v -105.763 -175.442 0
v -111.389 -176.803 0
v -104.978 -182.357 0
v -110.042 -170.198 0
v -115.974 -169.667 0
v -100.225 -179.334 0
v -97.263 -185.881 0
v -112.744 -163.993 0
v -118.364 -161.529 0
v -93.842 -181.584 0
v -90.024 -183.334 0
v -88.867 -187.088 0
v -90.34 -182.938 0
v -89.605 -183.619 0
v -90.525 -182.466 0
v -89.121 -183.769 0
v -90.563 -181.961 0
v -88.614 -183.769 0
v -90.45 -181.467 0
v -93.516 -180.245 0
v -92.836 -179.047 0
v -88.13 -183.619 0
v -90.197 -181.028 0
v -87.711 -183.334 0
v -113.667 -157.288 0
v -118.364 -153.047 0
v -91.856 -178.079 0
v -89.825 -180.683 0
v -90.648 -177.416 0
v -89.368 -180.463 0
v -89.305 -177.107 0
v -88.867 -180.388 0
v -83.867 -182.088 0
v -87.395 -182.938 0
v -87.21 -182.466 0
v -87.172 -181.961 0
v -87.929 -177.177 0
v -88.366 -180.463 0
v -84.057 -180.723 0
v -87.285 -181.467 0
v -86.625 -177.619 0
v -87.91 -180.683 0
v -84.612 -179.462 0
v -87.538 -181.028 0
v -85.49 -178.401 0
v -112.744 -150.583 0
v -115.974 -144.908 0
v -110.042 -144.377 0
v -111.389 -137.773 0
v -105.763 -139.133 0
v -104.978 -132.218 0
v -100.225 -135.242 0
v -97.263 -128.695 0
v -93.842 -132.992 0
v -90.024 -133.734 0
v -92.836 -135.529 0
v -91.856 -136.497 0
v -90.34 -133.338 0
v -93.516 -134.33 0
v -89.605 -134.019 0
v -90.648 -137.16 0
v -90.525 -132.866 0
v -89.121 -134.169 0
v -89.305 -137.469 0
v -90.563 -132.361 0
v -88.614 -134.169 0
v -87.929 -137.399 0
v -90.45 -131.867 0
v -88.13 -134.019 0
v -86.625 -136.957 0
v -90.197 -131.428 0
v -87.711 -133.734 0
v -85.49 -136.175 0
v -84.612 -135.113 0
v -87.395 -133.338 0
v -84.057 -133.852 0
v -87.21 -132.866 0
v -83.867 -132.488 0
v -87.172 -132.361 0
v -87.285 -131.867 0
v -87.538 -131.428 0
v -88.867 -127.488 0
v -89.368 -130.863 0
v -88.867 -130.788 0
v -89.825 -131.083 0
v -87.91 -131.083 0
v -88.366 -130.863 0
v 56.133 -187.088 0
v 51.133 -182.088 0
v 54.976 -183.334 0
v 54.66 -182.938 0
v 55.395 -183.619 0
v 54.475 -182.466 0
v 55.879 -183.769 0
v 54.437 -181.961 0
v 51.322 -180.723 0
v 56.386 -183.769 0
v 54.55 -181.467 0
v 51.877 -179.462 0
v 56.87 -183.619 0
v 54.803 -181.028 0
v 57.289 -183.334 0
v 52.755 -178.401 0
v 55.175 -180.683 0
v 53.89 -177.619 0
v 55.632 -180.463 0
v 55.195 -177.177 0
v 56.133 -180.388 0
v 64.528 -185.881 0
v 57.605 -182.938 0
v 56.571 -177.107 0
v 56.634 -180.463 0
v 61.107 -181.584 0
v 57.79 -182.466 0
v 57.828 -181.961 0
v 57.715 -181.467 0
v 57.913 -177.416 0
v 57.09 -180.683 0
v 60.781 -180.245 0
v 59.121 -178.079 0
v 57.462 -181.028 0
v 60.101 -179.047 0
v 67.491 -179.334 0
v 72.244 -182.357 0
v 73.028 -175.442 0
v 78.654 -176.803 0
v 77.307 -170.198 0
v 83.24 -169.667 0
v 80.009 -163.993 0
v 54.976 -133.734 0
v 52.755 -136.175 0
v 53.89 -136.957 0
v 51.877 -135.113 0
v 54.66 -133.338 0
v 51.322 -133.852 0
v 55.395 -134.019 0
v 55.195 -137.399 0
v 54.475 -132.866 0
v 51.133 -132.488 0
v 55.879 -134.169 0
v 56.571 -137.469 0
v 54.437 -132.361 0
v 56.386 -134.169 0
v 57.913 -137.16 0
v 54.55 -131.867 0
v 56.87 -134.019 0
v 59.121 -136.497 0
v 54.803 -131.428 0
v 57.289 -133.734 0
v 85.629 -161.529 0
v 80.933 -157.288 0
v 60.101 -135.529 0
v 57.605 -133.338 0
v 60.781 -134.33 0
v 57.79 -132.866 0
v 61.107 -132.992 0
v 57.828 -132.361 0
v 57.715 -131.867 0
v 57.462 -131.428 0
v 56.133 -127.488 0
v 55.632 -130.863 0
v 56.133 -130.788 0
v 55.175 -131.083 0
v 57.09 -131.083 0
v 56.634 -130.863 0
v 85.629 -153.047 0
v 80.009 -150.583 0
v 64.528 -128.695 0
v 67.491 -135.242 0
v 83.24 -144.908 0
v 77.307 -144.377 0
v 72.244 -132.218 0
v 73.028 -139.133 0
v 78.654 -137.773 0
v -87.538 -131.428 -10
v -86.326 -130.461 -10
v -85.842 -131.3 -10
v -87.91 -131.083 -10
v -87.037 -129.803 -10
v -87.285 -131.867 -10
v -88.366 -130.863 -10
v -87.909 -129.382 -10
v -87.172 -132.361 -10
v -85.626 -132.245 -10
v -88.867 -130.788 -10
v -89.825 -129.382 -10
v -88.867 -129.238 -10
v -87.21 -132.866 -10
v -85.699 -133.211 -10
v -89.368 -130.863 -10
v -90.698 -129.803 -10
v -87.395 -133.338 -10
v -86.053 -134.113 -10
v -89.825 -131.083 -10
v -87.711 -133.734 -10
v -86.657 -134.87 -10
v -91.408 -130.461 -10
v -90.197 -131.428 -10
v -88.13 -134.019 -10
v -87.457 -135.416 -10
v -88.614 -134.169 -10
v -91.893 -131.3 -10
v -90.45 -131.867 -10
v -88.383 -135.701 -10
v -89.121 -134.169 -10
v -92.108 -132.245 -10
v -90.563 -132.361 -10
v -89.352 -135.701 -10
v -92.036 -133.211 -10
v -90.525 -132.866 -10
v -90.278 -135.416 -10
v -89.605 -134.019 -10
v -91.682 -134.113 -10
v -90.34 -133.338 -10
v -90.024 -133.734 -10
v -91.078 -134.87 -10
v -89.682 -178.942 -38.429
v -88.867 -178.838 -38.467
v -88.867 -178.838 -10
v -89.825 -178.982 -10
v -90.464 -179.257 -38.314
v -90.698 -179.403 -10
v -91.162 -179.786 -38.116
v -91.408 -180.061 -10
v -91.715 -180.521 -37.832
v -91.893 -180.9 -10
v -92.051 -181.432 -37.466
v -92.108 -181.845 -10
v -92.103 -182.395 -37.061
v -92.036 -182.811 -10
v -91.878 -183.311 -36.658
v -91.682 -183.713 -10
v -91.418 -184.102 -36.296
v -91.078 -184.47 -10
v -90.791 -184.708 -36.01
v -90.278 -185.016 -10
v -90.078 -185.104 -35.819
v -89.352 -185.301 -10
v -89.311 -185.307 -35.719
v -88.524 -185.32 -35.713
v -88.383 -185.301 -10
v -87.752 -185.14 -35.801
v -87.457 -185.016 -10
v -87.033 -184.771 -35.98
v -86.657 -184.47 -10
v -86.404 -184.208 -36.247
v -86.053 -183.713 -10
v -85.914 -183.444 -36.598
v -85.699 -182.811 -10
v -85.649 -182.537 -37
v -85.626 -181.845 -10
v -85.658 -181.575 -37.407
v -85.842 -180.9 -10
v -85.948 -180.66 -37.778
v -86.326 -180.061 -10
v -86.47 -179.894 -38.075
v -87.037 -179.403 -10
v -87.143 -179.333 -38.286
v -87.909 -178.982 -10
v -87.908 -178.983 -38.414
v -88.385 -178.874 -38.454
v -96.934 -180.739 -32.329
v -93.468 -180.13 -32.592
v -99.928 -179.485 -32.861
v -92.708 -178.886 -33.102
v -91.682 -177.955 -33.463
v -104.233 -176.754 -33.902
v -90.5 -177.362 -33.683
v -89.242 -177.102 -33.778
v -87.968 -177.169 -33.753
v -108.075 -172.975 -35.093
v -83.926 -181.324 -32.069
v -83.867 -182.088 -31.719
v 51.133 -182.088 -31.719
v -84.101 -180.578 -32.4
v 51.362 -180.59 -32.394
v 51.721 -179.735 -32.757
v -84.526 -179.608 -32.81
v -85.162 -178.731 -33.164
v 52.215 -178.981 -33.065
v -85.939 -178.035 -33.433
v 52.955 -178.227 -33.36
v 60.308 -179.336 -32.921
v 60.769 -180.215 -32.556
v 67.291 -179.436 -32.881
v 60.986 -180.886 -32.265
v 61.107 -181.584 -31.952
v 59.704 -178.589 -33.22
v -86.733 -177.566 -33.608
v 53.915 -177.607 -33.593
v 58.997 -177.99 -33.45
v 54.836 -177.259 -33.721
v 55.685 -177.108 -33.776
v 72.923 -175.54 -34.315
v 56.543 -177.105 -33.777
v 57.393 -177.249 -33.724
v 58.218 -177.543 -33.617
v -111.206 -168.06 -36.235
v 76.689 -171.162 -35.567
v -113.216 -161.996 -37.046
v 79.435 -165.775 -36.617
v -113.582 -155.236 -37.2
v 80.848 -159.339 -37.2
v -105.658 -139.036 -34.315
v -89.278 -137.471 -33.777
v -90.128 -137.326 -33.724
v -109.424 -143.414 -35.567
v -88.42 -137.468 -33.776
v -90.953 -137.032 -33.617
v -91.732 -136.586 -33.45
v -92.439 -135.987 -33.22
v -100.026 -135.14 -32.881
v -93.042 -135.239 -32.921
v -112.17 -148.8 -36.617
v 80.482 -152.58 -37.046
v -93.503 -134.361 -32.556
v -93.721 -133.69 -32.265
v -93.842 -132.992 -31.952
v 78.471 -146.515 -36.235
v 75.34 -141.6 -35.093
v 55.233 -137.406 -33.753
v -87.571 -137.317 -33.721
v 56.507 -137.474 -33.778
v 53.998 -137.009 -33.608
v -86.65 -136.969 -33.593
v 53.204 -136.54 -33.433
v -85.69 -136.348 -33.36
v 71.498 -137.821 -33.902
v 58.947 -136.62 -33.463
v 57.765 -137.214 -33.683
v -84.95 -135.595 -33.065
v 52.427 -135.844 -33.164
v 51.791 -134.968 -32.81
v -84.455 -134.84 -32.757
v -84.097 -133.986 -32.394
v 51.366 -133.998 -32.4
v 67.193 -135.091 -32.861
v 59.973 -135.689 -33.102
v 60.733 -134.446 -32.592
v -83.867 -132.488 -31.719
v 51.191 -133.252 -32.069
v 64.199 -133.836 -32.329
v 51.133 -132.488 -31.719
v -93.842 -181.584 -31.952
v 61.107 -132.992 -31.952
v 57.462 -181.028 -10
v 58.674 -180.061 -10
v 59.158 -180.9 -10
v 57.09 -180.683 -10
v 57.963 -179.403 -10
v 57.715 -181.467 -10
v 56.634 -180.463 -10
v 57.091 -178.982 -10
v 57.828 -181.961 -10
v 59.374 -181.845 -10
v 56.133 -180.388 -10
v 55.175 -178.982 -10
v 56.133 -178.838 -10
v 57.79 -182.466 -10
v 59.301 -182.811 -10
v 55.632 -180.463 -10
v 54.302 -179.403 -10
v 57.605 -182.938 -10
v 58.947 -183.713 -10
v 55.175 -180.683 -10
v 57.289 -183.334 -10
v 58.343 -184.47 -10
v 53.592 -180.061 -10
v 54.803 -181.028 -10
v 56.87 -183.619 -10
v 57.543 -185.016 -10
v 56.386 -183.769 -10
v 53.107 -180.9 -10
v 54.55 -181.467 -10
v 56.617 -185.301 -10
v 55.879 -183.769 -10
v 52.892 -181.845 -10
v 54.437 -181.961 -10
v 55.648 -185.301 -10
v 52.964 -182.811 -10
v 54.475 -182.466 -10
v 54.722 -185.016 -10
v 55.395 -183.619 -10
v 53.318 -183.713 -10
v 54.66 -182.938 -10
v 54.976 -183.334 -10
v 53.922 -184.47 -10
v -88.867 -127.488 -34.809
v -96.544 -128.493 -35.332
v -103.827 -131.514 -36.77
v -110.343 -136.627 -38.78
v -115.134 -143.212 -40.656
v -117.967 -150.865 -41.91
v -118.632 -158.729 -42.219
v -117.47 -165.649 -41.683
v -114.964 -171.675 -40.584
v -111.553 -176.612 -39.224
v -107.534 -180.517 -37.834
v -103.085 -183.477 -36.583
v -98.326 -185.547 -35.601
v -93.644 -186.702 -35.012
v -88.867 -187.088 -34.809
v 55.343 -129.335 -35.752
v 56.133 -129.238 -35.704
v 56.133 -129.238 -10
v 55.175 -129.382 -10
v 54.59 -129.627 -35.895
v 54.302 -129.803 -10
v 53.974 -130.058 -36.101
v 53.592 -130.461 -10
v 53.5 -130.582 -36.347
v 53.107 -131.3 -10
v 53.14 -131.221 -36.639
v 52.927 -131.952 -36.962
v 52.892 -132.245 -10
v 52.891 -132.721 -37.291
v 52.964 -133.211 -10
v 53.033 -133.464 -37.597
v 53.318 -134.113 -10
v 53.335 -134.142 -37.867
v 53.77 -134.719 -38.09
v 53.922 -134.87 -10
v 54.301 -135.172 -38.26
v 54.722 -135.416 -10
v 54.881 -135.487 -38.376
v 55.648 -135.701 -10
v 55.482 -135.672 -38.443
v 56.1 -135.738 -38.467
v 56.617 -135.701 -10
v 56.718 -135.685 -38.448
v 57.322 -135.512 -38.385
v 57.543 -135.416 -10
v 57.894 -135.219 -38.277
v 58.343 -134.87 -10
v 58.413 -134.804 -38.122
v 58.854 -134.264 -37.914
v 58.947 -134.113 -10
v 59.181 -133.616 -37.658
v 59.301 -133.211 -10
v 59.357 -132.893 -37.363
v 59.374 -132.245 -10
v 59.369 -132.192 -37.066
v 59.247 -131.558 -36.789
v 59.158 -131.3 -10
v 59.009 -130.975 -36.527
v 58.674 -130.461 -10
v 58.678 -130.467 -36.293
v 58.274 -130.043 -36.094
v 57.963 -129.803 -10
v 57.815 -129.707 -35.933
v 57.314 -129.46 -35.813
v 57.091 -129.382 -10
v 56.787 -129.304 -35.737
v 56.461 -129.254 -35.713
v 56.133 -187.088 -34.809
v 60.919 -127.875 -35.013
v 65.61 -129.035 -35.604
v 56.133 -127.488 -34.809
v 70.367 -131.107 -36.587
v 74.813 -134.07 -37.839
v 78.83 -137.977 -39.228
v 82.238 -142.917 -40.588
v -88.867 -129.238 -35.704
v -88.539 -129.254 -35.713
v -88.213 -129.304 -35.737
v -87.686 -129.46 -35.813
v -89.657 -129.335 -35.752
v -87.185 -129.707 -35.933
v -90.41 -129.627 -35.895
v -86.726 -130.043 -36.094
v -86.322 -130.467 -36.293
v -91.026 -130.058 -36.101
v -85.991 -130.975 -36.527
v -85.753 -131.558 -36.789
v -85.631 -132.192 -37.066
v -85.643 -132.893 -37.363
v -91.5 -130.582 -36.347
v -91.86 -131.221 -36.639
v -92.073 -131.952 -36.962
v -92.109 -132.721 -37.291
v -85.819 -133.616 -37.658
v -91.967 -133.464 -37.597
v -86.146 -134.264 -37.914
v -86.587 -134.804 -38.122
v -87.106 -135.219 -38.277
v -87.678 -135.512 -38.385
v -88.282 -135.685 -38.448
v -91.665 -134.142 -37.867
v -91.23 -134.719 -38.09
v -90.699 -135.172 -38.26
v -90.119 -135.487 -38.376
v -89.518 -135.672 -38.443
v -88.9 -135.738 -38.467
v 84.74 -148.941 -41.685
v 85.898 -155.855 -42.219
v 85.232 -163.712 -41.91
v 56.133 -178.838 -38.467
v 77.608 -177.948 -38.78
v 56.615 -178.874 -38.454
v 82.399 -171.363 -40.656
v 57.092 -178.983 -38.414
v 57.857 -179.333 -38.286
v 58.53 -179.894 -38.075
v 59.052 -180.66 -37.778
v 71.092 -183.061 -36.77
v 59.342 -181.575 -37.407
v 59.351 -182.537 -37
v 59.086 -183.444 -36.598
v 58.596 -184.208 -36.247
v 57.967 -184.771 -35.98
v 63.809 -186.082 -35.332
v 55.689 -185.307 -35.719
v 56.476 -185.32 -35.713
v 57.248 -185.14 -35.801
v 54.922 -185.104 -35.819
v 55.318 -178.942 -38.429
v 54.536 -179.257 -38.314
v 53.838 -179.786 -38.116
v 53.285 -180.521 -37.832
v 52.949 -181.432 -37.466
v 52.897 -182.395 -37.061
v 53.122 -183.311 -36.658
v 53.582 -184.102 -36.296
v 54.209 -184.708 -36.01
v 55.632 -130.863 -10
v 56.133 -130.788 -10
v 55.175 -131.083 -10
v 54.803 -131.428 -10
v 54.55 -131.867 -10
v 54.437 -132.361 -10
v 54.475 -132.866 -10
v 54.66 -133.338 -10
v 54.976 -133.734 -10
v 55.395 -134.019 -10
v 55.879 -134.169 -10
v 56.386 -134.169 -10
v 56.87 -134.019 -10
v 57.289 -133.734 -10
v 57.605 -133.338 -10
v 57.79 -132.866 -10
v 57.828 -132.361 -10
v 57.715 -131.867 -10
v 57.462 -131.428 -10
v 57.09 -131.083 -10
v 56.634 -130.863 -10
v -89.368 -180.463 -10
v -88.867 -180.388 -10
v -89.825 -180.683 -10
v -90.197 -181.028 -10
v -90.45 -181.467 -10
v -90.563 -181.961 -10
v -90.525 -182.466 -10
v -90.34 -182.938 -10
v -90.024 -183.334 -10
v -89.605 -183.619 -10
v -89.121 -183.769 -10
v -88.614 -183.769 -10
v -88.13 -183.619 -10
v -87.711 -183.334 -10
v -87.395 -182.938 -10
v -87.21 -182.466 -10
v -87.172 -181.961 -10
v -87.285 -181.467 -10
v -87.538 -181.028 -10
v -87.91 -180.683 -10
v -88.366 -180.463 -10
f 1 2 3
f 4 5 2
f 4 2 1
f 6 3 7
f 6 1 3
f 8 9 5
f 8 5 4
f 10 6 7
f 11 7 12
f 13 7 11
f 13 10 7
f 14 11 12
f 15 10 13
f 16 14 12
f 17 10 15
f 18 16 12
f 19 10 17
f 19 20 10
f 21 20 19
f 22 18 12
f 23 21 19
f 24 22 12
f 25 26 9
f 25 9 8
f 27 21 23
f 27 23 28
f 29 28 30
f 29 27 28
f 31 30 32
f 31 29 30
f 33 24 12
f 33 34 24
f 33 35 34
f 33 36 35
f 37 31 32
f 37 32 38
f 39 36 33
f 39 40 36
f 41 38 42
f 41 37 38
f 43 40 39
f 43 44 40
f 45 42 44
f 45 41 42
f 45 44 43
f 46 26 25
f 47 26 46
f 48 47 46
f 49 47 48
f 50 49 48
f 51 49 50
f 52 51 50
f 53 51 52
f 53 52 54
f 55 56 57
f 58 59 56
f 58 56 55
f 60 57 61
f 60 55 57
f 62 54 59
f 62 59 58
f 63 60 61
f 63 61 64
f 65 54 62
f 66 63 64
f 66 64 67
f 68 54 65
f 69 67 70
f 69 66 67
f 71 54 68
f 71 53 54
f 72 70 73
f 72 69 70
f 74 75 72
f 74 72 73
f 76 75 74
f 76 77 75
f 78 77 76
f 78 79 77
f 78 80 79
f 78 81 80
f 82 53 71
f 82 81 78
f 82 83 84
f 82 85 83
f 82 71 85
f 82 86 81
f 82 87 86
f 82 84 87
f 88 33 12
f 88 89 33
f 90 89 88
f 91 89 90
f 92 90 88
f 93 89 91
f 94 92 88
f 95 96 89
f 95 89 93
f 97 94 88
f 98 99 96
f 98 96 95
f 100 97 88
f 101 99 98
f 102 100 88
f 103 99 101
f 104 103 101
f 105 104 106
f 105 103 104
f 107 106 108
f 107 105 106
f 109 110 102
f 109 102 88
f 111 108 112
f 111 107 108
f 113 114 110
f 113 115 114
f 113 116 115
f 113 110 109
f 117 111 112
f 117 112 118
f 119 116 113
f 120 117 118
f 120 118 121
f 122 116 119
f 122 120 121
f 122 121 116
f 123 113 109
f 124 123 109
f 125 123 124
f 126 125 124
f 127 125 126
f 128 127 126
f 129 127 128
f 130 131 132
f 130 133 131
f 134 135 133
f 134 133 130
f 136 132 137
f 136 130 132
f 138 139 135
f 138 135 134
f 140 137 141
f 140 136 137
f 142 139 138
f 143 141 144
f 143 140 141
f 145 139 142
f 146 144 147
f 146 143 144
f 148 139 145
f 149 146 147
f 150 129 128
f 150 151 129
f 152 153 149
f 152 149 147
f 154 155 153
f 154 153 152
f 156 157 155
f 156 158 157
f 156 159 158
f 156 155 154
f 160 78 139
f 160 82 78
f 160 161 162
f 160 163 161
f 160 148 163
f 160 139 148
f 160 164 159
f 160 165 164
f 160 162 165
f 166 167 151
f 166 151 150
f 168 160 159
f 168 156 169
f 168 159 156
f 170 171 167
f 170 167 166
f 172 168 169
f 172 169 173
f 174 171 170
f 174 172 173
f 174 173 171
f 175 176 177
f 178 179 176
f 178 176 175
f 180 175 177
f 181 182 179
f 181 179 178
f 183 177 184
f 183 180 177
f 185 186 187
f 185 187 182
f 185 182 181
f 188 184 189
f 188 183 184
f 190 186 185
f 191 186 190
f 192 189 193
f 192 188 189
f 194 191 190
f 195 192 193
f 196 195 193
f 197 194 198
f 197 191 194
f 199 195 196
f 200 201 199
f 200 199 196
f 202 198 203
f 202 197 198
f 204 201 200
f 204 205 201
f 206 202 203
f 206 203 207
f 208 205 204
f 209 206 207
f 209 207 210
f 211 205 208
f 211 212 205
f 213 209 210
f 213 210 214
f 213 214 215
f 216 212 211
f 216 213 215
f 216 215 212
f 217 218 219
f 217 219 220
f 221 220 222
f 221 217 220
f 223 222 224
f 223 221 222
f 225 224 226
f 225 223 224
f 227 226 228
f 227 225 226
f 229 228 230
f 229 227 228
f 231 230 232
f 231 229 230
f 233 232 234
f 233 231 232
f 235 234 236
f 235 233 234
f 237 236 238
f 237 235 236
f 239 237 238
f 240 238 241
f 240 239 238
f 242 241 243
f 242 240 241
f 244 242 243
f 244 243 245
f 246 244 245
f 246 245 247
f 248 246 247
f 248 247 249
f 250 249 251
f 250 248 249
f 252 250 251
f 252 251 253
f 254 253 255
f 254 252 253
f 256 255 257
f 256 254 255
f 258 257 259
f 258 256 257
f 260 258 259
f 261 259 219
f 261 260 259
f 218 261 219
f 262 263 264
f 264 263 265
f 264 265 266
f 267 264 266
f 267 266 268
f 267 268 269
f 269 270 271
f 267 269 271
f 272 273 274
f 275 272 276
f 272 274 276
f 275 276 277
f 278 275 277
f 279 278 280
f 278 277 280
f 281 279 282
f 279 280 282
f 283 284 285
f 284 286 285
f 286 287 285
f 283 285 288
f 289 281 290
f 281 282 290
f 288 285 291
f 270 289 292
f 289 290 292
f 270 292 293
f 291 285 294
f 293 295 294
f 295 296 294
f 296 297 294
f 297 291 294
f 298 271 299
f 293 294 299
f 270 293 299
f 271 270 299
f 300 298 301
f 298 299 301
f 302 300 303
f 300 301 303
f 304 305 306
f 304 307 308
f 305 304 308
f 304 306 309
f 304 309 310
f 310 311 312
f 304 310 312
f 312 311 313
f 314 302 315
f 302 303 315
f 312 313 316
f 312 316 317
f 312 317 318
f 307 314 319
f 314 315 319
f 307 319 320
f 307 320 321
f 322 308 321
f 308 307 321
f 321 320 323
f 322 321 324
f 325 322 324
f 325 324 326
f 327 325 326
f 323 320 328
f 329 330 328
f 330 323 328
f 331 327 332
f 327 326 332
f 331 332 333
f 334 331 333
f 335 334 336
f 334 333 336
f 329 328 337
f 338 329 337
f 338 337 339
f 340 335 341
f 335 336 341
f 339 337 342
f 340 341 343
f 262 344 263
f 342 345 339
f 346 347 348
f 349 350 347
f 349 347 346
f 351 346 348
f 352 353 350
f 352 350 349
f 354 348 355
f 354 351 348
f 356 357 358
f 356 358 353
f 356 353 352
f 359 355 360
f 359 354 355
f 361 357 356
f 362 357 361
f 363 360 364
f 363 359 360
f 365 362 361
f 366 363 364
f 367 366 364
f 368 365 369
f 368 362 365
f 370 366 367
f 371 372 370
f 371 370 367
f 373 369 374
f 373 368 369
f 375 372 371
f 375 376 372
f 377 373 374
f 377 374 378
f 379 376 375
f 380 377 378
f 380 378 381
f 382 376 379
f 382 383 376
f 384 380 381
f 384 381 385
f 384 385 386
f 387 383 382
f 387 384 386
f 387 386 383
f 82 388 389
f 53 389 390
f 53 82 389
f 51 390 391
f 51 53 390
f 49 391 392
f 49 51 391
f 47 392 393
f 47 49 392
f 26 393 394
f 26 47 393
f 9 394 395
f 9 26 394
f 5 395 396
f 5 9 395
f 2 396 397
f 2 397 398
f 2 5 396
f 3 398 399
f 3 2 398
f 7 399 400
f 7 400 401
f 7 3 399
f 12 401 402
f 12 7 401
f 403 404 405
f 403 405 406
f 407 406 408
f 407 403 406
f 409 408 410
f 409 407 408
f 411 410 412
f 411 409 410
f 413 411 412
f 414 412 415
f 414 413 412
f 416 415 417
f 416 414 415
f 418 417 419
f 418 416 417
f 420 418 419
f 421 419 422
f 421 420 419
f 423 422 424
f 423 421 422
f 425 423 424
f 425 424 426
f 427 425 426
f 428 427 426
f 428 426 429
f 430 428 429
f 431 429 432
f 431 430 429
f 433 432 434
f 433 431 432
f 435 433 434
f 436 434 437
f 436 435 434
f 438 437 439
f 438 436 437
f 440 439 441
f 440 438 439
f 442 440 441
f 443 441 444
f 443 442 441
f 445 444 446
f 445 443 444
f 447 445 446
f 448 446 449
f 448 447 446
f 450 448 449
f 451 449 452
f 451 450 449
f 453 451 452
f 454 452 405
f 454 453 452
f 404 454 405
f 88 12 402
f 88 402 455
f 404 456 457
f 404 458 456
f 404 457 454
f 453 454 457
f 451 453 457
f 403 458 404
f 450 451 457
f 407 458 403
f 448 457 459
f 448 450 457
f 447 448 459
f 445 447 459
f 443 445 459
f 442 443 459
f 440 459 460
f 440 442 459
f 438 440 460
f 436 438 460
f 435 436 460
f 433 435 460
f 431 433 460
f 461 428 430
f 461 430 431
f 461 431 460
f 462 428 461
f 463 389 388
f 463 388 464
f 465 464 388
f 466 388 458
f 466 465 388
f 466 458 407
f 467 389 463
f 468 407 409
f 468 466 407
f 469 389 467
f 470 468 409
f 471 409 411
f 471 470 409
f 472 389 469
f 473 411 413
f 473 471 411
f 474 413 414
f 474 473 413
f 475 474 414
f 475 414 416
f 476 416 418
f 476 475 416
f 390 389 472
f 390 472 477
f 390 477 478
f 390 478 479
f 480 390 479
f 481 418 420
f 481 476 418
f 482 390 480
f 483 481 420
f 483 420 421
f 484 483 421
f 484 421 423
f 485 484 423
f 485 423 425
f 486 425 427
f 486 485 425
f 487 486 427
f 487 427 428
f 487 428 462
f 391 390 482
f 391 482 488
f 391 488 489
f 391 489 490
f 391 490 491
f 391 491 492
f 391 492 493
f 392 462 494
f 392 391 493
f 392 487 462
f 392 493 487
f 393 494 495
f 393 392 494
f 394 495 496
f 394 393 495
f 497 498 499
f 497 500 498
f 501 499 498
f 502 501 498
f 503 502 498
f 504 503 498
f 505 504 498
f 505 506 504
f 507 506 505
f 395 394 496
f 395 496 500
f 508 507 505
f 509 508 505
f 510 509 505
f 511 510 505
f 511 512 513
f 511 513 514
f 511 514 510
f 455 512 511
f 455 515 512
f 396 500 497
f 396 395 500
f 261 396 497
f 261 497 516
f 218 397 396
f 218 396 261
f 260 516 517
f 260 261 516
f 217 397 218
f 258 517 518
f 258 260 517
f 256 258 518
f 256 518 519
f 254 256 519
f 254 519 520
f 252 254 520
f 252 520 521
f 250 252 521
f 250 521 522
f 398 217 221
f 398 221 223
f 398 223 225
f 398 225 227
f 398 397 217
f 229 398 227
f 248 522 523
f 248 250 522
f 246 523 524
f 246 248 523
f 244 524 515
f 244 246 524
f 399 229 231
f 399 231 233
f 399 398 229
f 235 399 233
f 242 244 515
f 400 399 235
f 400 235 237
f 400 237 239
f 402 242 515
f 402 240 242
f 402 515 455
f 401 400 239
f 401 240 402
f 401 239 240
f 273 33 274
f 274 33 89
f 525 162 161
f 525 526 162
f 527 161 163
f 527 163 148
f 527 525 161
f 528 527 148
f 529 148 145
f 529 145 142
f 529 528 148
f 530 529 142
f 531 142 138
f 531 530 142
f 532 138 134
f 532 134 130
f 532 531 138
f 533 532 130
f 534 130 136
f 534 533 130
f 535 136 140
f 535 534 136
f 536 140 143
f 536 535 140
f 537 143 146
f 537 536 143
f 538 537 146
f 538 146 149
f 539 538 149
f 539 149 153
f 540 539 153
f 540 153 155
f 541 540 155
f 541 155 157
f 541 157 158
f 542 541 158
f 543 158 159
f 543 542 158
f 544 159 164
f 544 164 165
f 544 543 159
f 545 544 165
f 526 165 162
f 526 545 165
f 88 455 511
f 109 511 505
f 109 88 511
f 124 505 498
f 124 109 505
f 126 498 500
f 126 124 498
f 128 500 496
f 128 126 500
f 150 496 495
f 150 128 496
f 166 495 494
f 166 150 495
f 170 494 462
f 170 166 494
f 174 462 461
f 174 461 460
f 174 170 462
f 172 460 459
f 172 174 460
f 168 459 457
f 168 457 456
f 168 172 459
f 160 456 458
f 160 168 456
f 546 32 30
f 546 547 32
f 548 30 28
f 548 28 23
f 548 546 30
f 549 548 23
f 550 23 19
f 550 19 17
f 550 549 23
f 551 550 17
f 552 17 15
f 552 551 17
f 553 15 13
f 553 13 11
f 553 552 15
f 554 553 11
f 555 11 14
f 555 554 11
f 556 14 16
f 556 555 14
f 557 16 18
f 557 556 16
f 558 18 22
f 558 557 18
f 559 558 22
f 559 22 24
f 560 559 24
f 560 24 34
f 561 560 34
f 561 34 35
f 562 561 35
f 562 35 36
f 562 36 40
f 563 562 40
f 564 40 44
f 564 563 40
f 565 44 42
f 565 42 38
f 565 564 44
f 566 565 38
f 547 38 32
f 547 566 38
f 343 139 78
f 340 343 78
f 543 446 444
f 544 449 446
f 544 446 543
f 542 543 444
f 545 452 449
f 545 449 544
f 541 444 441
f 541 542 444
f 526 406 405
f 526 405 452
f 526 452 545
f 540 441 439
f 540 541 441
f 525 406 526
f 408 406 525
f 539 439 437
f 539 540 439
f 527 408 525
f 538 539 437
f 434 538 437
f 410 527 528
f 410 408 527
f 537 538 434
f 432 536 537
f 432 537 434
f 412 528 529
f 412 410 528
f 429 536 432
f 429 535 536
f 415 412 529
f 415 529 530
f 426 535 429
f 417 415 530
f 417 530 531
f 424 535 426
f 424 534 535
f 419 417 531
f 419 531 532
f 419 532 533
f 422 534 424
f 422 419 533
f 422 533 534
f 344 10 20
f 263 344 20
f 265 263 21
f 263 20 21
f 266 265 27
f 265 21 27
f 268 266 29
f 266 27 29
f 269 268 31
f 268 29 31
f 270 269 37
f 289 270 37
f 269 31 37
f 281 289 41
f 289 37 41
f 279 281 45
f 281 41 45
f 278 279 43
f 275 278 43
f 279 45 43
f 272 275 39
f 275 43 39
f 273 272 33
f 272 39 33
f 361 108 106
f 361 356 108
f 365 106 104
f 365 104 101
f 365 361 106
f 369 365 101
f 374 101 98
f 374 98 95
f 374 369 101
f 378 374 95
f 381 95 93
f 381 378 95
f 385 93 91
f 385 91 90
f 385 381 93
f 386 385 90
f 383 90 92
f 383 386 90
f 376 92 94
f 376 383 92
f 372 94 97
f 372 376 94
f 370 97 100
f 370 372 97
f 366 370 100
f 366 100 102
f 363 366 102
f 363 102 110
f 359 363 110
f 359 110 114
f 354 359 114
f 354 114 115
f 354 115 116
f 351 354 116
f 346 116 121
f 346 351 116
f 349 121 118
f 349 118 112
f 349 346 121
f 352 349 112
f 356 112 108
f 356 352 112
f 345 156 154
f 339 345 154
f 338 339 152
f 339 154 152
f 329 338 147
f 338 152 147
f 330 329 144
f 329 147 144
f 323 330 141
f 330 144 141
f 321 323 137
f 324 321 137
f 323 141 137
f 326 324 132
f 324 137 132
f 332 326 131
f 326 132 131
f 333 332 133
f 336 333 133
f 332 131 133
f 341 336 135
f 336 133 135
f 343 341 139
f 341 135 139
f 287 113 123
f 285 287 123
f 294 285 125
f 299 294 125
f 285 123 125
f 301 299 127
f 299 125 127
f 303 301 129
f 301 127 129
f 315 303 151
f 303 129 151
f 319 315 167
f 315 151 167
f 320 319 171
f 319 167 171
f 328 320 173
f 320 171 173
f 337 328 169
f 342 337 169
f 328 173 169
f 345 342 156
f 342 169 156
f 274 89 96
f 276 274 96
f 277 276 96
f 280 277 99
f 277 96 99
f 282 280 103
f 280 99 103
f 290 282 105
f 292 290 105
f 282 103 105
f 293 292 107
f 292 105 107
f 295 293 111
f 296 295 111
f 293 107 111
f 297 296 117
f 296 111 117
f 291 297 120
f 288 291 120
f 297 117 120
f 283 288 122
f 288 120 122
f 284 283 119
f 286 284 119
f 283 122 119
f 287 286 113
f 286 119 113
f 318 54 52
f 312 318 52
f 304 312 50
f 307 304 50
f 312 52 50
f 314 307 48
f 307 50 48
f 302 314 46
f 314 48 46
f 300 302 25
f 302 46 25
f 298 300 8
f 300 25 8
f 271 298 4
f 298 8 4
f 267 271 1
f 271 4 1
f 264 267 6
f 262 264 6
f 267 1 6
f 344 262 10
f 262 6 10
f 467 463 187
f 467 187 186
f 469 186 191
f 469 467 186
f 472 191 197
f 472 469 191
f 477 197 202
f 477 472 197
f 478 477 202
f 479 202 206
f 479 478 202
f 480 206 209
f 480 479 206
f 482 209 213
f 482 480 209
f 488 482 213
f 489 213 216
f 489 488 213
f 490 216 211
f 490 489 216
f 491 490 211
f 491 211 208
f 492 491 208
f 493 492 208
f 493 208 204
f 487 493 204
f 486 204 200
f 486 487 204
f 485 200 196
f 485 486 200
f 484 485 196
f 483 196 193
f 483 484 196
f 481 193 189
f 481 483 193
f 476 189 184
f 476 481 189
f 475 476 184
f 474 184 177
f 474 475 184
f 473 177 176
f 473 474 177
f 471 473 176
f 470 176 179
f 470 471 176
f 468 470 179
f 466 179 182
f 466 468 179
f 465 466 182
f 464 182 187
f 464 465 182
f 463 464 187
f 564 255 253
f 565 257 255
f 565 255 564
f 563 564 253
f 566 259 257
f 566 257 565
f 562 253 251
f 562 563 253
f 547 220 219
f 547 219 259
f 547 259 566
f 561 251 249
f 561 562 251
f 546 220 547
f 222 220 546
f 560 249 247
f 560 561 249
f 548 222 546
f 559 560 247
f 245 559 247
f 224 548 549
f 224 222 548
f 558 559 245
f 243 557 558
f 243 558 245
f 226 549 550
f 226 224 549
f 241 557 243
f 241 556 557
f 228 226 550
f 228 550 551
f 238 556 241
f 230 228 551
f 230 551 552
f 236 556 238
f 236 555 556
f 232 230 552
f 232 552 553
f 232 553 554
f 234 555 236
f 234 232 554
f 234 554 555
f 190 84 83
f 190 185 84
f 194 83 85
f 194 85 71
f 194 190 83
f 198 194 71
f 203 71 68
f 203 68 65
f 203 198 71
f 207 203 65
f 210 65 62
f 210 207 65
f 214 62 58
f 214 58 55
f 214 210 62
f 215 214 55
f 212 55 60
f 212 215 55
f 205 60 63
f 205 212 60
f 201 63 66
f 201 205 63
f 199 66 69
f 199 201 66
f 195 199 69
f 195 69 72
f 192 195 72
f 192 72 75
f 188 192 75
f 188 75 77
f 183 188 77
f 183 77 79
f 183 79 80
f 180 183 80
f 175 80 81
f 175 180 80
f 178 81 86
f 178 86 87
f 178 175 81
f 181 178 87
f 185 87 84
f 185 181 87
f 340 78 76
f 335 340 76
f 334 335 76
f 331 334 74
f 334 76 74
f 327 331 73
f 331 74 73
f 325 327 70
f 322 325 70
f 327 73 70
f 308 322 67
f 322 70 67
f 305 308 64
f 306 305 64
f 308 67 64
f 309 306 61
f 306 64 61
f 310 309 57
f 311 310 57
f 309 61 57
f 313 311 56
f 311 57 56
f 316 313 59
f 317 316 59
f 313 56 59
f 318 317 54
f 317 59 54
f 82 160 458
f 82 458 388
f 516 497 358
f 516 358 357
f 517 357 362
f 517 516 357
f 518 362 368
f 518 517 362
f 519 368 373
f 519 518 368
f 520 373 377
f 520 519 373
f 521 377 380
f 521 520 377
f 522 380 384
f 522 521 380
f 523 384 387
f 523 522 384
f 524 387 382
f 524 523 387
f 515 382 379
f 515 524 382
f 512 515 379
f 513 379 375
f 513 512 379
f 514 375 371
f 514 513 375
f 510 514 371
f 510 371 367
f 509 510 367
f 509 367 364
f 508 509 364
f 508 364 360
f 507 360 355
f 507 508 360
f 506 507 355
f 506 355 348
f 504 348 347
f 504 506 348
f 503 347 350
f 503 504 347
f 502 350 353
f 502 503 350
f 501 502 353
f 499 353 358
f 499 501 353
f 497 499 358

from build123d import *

# Parameters (mm, degrees)
BOSS_EXTRUDE2_DEPTH                          = 45
CUT_EXTRUDE1_START                           = -120
CUT_EXTRUDE1_DEPTH                           = 207
CBORE_FOR_M3_HEX_SOCKET_HEAD_CAP_SCR_2_COUNT = 2
CBORE_FOR_M3_HEX_SOCKET_HEAD_CAP_SCR_2_PITCH = 145
CBORE_FOR_M3_HEX_SOCKET_HEAD_CAP_SCR_3_COUNT = 2
CBORE_FOR_M3_HEX_SOCKET_HEAD_CAP_SCR_3_PITCH = 153.248686781
CBORE_FOR_M3_HEX_SOCKET_HEAD_CAP_SCR_4_COUNT = 2
CBORE_FOR_M3_HEX_SOCKET_HEAD_CAP_SCR_4_PITCH = 49.6
CUT_EXTRUDE2_REACH                           = 227.539
CUT_EXTRUDE2_END_RADIUS                      = 58.5
CUT_EXTRUDE2_DIRECTION_2_DEPTH               = 226.538529612


with BuildPart() as part:
    # Sketch2 → Boss-Extrude2 (new body)
    with BuildSketch(Plane.XY):
        with BuildLine():
            Line((56.132610552, -127.487790866), (-88.867389448, -127.487790866))
            ThreePointArc((-88.867389448, -127.487790866), (-118.667389448, -157.287790866), (-88.867389448, -187.087790866))
            Line((-88.867389448, -187.087790866), (56.132610552, -187.087790866))
            ThreePointArc((56.132610552, -187.087790866), (85.932610552, -157.287790866), (56.132610552, -127.487790866))
        make_face()
    extrude(amount=-BOSS_EXTRUDE2_DEPTH)

    # Cut-Extrude1: read off the stored shape, not the designer's step
    # Cut-Extrude1 outline → Cut-Extrude1 (cut)
    with BuildSketch(Plane(origin=(0, 0, 0), x_dir=(0, 0, -1), z_dir=(1, 0, 0)).offset(CUT_EXTRUDE1_START)):
        with BuildLine():
            ThreePointArc((34.808748648, -127.487777676), (42.2355, -157.287790865), (34.808748648, -187.087804055))
            Line((34.808748648, -187.087804055), (45, -187.087790866))
            Line((45, -187.087790866), (45, -127.487790866))
            Line((45, -127.487790866), (34.808748648, -127.487777676))
        make_face()
    extrude(amount=CUT_EXTRUDE1_DEPTH, mode=Mode.SUBTRACT)

    # Sketch6 → CBORE for M3 Hex Socket Head Cap Screw1 (revolve, cut)
    with BuildSketch(Plane(origin=(56.132610552, -132.487790866, -40), x_dir=(0, 1, 0), z_dir=(1, 0, 0))):
        Polygon((0, 0), (0, 40), (1.7, 40), (1.7, 30), (3.25, 30), (3.25, 0.025), (3.275, 0), align=None)
    cbore_for_m3_hex_socket_head_cap_screw1 = revolve(axis=Axis((56.132610552, -132.487790866, -46.35), (0, 0, 1)), mode=Mode.SUBTRACT)

    # CBORE for M3 Hex Socket Head Cap Scr 2: CBORE for M3 Hex Socket Head Cap Screw1 ×2
    with Locations(*[(-i * CBORE_FOR_M3_HEX_SOCKET_HEAD_CAP_SCR_2_PITCH, 0, 0) for i in range(1, CBORE_FOR_M3_HEX_SOCKET_HEAD_CAP_SCR_2_COUNT)]):
        add(cbore_for_m3_hex_socket_head_cap_screw1, mode=Mode.SUBTRACT)

    # CBORE for M3 Hex Socket Head Cap Scr 3: CBORE for M3 Hex Socket Head Cap Screw1 ×2
    with Locations(*[Vector(-0.9461745026730805, -0.32365693332809825, 0) * (i * CBORE_FOR_M3_HEX_SOCKET_HEAD_CAP_SCR_3_PITCH) for i in range(1, CBORE_FOR_M3_HEX_SOCKET_HEAD_CAP_SCR_3_COUNT)]):
        add(cbore_for_m3_hex_socket_head_cap_screw1, mode=Mode.SUBTRACT)

    # CBORE for M3 Hex Socket Head Cap Scr 4: CBORE for M3 Hex Socket Head Cap Screw1 ×2
    with Locations(*[(0, -i * CBORE_FOR_M3_HEX_SOCKET_HEAD_CAP_SCR_4_PITCH, 0) for i in range(1, CBORE_FOR_M3_HEX_SOCKET_HEAD_CAP_SCR_4_COUNT)]):
        add(cbore_for_m3_hex_socket_head_cap_screw1, mode=Mode.SUBTRACT)

    # Cut-Extrude2: up to this cylinder (the profile starts inside it)
    cut_extrude2_end = Plane(origin=(-16.367389, -157.287790866, 21.2645), z_dir=(1, 0, 0)) * Cylinder(CUT_EXTRUDE2_END_RADIUS, 573.078, mode=Mode.PRIVATE)
    # Sketch7 → Cut-Extrude2 (cut, up to the surface)
    with BuildSketch(Plane.XY, mode=Mode.PRIVATE) as cut_extrude2_sk1:
        with BuildLine():
            ThreePointArc((-93.841919726, -181.583758608), (-88.615051766, -177.094162356), (-83.867389448, -182.087790866))
            Line((-83.867389448, -182.087790866), (51.132610552, -182.087790866))
            ThreePointArc((51.132610552, -182.087790866), (55.88027287, -177.094162356), (61.10714083, -181.583758608))
            ThreePointArc((61.10714083, -181.583758608), (80.932610552, -157.287790866), (61.10714083, -132.991823124))
            ThreePointArc((61.10714083, -132.991823124), (55.88027287, -137.481419376), (51.132610552, -132.487790866))
            Line((51.132610552, -132.487790866), (-83.867389448, -132.487790866))
            ThreePointArc((-83.867389448, -132.487790866), (-88.615051766, -137.481419376), (-93.841919726, -132.991823124))
            ThreePointArc((-93.841919726, -132.991823124), (-113.667389448, -157.287790866), (-93.841919726, -181.583758608))
        make_face()
    cut_extrude2_tool1 = extrude(cut_extrude2_sk1.sketch, amount=-CUT_EXTRUDE2_REACH, mode=Mode.PRIVATE) & cut_extrude2_end
    add(cut_extrude2_tool1.solids().sort_by_distance((-16.367389, -157.287791, 0))[0], mode=Mode.SUBTRACT)

    # Sketch7 → Cut-Extrude2 direction 2 (cut)
    with BuildSketch(Plane.XY):
        with BuildLine():
            ThreePointArc((-93.841919726, -181.583758608), (-88.615051766, -177.094162356), (-83.867389448, -182.087790866))
            Line((-83.867389448, -182.087790866), (51.132610552, -182.087790866))
            ThreePointArc((51.132610552, -182.087790866), (55.88027287, -177.094162356), (61.10714083, -181.583758608))
            ThreePointArc((61.10714083, -181.583758608), (80.932610552, -157.287790866), (61.10714083, -132.991823124))
            ThreePointArc((61.10714083, -132.991823124), (55.88027287, -137.481419376), (51.132610552, -132.487790866))
            Line((51.132610552, -132.487790866), (-83.867389448, -132.487790866))
            ThreePointArc((-83.867389448, -132.487790866), (-88.615051766, -137.481419376), (-93.841919726, -132.991823124))
            ThreePointArc((-93.841919726, -132.991823124), (-113.667389448, -157.287790866), (-93.841919726, -181.583758608))
        make_face()
    extrude(amount=CUT_EXTRUDE2_DIRECTION_2_DEPTH, mode=Mode.SUBTRACT)


solid = part.part
